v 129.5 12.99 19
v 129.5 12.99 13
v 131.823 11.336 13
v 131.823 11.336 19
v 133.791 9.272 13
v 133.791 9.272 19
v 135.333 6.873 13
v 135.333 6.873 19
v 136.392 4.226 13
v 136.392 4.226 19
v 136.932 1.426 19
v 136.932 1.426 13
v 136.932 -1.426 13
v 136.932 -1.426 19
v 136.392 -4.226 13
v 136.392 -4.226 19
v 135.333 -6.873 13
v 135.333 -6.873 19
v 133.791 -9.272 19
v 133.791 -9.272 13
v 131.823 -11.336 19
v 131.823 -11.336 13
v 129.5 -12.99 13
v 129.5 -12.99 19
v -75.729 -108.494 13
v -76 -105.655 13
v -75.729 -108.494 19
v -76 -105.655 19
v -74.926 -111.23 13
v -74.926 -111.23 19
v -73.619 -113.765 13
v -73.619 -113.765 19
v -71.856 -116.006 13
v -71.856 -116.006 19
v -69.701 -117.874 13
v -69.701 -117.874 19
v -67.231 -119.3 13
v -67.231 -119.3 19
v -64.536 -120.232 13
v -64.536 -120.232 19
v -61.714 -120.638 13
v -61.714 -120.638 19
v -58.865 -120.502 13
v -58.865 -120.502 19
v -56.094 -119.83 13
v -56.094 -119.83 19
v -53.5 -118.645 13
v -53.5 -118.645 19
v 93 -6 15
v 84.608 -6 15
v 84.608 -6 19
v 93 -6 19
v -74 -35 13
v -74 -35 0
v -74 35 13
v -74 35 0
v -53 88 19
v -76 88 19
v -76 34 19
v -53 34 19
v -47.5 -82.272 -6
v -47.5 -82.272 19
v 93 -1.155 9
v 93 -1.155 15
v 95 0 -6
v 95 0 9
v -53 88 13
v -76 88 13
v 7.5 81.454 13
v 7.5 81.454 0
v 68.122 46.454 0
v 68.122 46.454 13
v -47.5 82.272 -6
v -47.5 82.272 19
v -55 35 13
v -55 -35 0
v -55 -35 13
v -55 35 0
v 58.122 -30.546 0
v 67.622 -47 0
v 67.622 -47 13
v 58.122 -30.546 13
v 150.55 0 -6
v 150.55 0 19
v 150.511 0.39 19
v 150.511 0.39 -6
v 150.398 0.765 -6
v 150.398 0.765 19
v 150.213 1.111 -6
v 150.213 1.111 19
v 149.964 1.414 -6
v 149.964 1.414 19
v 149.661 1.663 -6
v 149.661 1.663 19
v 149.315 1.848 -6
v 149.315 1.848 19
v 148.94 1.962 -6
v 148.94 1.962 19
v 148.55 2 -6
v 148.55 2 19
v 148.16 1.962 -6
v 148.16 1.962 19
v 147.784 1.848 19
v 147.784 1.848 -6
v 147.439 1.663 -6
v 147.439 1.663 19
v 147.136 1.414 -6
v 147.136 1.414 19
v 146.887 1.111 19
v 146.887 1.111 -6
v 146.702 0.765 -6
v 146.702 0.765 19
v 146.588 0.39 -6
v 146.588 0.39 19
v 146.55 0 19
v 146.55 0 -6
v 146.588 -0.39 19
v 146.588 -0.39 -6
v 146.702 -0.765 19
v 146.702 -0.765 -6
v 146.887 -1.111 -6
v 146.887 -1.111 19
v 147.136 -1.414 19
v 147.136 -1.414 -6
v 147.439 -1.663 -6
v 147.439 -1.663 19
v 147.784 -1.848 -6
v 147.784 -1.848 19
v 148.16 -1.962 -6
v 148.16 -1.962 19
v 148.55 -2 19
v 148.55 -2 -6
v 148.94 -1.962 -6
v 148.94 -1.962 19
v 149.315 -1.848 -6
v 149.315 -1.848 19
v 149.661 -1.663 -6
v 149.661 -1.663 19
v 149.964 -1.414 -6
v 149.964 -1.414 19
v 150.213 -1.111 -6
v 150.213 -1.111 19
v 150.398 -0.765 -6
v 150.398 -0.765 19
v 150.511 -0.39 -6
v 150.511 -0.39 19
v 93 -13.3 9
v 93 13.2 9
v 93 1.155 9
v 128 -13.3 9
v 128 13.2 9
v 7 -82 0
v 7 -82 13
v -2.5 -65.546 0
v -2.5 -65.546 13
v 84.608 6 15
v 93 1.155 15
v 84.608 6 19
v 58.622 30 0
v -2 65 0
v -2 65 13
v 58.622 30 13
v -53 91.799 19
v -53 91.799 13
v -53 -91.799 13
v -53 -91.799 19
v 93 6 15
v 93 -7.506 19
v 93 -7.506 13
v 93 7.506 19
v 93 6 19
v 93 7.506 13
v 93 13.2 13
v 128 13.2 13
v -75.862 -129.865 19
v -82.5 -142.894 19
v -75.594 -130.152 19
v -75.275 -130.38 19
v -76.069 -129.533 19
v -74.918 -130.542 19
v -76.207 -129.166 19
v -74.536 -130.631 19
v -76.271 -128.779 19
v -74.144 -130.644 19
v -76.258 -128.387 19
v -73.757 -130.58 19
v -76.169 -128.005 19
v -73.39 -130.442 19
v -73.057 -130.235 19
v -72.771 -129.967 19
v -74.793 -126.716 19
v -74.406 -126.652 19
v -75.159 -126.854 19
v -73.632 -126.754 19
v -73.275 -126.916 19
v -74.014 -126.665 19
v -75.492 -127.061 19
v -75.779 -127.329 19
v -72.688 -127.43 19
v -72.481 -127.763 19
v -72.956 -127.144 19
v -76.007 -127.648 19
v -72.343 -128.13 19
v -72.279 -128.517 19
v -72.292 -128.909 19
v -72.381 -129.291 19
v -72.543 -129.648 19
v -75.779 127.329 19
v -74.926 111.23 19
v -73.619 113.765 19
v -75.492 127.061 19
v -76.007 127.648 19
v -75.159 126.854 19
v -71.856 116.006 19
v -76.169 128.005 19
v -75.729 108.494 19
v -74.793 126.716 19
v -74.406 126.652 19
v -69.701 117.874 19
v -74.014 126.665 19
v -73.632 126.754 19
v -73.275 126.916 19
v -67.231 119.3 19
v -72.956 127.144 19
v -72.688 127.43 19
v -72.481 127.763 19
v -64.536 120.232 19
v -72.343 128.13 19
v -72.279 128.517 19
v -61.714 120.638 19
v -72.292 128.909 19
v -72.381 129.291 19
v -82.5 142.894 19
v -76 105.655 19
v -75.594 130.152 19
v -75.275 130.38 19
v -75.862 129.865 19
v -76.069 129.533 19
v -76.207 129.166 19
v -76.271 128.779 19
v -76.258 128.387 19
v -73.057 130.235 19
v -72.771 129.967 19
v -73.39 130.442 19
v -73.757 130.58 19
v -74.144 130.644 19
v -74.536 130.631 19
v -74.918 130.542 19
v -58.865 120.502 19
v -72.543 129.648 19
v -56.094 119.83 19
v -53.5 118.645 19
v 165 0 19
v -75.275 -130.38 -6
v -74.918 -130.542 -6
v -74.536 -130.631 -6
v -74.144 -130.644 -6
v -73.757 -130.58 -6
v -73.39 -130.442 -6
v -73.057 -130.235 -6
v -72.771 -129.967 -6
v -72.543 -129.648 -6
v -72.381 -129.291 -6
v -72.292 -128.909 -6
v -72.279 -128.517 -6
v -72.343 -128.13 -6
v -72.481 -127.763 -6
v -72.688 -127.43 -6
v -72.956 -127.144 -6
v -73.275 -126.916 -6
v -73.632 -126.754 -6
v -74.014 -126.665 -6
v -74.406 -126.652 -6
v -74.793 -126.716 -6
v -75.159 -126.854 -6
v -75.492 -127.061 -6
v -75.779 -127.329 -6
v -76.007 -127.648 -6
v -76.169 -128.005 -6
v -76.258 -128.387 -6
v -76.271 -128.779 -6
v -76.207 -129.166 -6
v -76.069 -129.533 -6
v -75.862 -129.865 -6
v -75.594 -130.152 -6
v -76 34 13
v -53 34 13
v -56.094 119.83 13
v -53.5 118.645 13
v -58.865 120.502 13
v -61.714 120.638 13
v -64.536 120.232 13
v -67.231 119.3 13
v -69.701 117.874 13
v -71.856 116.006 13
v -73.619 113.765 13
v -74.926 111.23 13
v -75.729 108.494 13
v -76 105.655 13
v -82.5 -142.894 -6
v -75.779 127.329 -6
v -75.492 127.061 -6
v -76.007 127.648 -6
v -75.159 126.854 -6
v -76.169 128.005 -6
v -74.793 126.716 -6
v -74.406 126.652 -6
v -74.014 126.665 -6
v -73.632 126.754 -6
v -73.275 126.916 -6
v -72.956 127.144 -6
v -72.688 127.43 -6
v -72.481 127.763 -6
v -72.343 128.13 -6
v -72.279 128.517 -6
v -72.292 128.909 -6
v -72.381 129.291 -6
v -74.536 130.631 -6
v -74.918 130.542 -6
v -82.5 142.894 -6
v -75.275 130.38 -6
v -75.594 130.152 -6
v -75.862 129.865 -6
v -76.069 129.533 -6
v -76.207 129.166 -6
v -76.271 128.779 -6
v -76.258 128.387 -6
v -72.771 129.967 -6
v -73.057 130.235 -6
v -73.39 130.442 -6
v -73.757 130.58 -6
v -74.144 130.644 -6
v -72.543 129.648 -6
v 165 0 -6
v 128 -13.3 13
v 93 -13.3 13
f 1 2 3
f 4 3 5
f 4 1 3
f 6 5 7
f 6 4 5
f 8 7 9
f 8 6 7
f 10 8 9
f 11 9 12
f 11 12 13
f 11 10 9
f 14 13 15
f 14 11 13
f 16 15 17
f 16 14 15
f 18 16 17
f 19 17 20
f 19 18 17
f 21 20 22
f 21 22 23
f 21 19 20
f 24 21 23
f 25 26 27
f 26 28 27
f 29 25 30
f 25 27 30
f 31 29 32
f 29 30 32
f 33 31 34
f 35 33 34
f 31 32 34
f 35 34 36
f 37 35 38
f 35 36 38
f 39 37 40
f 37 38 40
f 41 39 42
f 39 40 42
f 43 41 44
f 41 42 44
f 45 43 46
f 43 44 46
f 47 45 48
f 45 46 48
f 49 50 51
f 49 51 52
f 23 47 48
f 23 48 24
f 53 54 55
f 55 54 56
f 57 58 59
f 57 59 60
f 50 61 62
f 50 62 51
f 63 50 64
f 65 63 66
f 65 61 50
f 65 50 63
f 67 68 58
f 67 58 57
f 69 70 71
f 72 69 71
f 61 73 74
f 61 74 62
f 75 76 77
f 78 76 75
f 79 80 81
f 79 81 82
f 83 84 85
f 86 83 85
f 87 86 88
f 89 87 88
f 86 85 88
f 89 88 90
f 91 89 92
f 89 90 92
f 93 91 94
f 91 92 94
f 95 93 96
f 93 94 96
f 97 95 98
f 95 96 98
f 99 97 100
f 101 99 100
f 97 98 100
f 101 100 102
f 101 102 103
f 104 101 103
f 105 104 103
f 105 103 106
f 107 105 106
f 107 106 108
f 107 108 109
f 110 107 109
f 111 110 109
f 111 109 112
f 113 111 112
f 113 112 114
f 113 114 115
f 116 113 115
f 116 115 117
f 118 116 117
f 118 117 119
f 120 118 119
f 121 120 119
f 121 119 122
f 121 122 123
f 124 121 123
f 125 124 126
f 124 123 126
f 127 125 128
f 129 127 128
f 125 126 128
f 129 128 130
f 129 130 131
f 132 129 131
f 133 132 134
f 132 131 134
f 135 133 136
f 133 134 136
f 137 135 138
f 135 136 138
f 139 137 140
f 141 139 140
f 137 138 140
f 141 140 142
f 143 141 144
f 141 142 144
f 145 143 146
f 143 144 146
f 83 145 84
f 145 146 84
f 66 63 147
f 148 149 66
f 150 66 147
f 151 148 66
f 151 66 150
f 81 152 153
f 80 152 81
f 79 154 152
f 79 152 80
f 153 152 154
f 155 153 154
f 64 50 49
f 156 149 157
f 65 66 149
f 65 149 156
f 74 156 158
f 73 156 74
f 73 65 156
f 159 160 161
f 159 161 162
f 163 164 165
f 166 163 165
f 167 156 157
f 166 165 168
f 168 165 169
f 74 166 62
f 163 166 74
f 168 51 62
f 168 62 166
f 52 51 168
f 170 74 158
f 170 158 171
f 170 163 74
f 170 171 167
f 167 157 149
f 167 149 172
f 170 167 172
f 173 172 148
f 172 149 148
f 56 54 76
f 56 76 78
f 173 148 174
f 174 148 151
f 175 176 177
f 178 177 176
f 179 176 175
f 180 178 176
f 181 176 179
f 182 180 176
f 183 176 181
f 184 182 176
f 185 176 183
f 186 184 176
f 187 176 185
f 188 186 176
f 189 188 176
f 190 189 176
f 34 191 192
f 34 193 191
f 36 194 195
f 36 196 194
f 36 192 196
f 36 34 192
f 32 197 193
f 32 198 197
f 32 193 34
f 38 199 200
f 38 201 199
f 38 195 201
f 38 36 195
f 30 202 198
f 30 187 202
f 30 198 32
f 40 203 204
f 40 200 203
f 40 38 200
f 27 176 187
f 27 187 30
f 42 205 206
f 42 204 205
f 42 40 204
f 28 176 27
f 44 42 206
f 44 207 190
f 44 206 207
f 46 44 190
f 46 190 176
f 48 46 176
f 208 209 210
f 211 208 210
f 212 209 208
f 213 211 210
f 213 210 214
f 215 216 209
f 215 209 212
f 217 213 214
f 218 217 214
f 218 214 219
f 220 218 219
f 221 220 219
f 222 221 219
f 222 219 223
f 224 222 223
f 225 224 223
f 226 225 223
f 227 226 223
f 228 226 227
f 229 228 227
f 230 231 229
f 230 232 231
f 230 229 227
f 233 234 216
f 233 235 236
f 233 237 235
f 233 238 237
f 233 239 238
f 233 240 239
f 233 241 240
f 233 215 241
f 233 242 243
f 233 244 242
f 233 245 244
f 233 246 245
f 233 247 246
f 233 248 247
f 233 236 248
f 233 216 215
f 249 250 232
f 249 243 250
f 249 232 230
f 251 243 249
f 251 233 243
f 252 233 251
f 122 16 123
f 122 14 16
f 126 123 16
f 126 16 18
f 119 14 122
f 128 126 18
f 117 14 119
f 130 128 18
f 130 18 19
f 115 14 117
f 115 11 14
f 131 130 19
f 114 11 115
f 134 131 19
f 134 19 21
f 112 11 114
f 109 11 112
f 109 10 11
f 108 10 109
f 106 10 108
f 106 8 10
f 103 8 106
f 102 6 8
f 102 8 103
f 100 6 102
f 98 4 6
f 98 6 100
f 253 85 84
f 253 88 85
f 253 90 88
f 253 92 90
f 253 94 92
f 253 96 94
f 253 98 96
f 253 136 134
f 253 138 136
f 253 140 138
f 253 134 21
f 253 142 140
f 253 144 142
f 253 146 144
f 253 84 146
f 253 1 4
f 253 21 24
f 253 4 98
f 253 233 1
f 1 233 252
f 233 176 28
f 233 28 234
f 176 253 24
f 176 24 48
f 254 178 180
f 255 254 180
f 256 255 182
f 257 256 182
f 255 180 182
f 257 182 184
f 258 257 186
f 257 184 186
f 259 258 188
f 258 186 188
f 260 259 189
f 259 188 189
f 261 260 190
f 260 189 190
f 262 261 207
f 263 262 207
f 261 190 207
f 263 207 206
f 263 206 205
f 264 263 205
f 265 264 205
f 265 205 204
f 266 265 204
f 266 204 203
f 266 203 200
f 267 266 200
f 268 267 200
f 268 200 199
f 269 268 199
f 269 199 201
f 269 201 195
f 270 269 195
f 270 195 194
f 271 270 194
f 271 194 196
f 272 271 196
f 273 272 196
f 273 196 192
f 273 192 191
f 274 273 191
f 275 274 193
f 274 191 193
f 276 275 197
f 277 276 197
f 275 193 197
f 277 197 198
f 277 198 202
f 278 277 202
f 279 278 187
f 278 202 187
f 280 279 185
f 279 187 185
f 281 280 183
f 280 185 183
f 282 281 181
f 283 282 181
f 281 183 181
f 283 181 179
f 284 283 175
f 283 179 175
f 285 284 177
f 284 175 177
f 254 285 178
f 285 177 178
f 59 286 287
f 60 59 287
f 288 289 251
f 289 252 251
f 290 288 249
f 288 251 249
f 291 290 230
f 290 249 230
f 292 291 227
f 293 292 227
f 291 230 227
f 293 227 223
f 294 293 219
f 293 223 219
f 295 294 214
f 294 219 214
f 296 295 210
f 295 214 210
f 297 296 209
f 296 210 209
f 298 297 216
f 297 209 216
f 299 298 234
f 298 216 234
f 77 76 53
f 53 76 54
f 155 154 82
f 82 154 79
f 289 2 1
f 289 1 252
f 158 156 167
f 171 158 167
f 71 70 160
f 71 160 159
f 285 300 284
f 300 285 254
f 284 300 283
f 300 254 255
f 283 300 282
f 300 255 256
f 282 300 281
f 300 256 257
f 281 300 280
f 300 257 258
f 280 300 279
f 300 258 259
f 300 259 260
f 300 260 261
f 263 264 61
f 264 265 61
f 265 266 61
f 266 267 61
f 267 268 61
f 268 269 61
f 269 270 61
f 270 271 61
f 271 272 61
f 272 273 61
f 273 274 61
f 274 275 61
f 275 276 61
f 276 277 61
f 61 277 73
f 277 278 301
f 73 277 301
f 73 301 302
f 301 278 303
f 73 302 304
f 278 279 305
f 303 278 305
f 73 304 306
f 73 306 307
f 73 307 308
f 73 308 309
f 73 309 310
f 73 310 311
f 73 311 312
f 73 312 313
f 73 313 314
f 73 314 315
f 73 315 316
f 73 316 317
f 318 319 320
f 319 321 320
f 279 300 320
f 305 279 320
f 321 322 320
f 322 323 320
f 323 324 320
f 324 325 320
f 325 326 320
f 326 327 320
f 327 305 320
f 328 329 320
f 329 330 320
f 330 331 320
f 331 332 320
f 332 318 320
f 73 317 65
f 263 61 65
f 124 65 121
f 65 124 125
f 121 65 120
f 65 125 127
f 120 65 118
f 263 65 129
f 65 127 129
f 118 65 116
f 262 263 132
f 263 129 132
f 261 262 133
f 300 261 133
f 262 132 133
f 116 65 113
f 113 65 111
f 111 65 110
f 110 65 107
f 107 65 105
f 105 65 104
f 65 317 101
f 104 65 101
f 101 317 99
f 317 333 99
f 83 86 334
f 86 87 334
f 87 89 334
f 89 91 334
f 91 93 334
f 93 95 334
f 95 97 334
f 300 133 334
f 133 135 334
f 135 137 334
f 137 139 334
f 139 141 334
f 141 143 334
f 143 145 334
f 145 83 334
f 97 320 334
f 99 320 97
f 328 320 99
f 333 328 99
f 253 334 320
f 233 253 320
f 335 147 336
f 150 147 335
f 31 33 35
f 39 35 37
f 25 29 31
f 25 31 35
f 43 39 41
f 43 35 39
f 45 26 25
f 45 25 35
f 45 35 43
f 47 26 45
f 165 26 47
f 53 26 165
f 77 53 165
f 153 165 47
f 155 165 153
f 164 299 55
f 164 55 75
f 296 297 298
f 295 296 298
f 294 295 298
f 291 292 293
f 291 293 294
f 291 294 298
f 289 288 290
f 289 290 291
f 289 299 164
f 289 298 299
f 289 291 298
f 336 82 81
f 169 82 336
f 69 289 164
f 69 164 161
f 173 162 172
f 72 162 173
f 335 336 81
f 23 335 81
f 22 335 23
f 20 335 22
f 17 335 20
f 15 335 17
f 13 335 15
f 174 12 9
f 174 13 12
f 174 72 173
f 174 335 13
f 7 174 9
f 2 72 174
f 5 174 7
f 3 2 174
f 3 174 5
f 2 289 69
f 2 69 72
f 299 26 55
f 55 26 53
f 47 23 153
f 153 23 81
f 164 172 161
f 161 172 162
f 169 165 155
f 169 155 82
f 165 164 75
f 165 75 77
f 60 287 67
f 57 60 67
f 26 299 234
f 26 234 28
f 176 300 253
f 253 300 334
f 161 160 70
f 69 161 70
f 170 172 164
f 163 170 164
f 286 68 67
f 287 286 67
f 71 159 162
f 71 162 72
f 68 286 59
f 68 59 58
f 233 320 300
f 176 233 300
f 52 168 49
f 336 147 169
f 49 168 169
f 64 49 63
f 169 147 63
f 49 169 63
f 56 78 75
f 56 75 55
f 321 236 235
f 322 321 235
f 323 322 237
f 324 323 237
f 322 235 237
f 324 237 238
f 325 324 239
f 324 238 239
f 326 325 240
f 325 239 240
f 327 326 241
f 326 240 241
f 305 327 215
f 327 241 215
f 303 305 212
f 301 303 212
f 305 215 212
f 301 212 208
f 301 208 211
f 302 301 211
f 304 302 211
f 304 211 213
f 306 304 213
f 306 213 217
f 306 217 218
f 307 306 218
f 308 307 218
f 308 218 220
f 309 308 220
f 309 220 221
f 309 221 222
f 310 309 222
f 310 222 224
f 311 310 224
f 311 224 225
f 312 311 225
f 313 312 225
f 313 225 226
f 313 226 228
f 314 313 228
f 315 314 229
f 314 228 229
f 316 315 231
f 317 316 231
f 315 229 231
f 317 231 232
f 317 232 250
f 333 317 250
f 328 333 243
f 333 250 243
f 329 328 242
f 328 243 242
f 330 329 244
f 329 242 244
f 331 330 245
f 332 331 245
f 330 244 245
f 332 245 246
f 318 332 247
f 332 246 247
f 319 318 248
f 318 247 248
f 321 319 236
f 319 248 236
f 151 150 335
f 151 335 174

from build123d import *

# Parameters (mm, degrees)
BOX005_W               = 23
BOX005_H               = 54
BOX005_DEPTH           = 6
PRISM003_DEPTH         = 6
PRISM002_DEPTH         = 6
BOX004_W               = 10
BOX004_H               = 12
BOX004_DEPTH           = 4
BOX003_W               = 35
BOX003_H               = 26.5
BOX003_DEPTH           = 10
BOX002_W               = 70
BOX002_H               = 19
BOX002_DEPTH           = 19
BOX002_PLACEMENT_ANGLE = 30
BOX001_W               = 70
BOX001_H               = 19
BOX001_DEPTH           = 19
BOX001_PLACEMENT_ANGLE = 90
BOX_W                  = 70
BOX_H                  = 19
BOX_DEPTH              = 19
BOX_PLACEMENT_ANGLE    = 30
PRISM001_DEPTH         = 25
PRISM_DEPTH            = 25
FILLET_R               = 15
SKETCH001_R            = 2
POCKET_DEPTH           = 782.777352
POLARPATTERN_COUNT     = 3


with BuildPart() as box005:
    # Box005 → Box005 (new body)
    with BuildSketch(Plane(origin=(-76, 34, 13), x_dir=(1, 0, 0), z_dir=(0, 0, 1))):
        with Locations((11.5, 27)):
            Rectangle(BOX005_W, BOX005_H)
    extrude(amount=BOX005_DEPTH)


with BuildPart() as prism003:
    # Prism003 → Prism003 (new body)
    with BuildSketch(Plane.XY.offset(13)):
        Polygon((106, 0), (-53, 91.798693), (-53, -91.798693), align=None)
    extrude(amount=PRISM003_DEPTH)


with BuildPart() as cut006:
    # Prism002 → Prism002 (new body)
    with BuildSketch(Plane.XY.offset(13)):
        Polygon((152, 0), (-76, 131.635861), (-76, -131.635861), align=None)
    extrude(amount=PRISM002_DEPTH)

    # Cut006: cut Prism003
    add(prism003.part, mode=Mode.SUBTRACT)


with BuildPart() as box004:
    # Box004 → Box004 (new body)
    with BuildSketch(Plane(origin=(84, -6, 15), x_dir=(1, 0, 0), z_dir=(0, 0, 1))):
        with Locations((5, 6)):
            Rectangle(BOX004_W, BOX004_H)
    extrude(amount=BOX004_DEPTH)


with BuildPart() as box003:
    # Box003 → Box003 (new body)
    with BuildSketch(Plane(origin=(93, -13.3, 9), x_dir=(1, 0, 0), z_dir=(0, 0, 1))):
        with Locations((17.5, 13.25)):
            Rectangle(BOX003_W, BOX003_H)
    extrude(amount=BOX003_DEPTH)


with BuildPart() as box002:
    # Box002 → Box002 (new body)
    with BuildSketch(Plane.XY):
        with Locations((35, 9.5)):
            Rectangle(BOX002_W, BOX002_H)
    extrude(amount=BOX002_DEPTH)


with BuildPart() as box002_1:
    # Box002 placement: moved
    add(box002.part.moved(Location((7, -82, 0))).rotate(Axis((7, -82, 0), (0, 0, 1)), BOX002_PLACEMENT_ANGLE))


with BuildPart() as box001:
    # Box001 → Box001 (new body)
    with BuildSketch(Plane.XY):
        with Locations((35, 9.5)):
            Rectangle(BOX001_W, BOX001_H)
    extrude(amount=BOX001_DEPTH)


with BuildPart() as box001_1:
    # Box001 placement: moved
    add(box001.part.moved(Location((-55, -35, 0))).rotate(Axis((-55, -35, 0), (0, 0, 1)), BOX001_PLACEMENT_ANGLE))


with BuildPart() as box:
    # Box → Box (new body)
    with BuildSketch(Plane.XY):
        with Locations((35, 9.5)):
            Rectangle(BOX_W, BOX_H)
    extrude(amount=BOX_DEPTH)


with BuildPart() as box_1:
    # Box placement: moved
    add(box.part.moved(Location((-2, 65, 0))).rotate(Axis((-2, 65, 0), (0, 0, -1)), BOX_PLACEMENT_ANGLE))


with BuildPart() as prism001:
    # Prism001 → Prism001 (new body)
    with BuildSketch(Plane.XY.offset(-6)):
        Polygon((95, 0), (-47.5, 82.272413), (-47.5, -82.272413), align=None)
    extrude(amount=PRISM001_DEPTH)


with BuildPart() as body:
    # Prism → Prism (new body)
    with BuildSketch(Plane.XY.offset(-6)):
        Polygon((165, 0), (-82.5, 142.894192), (-82.5, -142.894192), align=None)
    extrude(amount=PRISM_DEPTH)

    # Cut: cut Prism001
    add(prism001.part, mode=Mode.SUBTRACT)

    # Cut001: cut Box
    add(box_1.part, mode=Mode.SUBTRACT)

    # Cut002: cut Box001
    add(box001_1.part, mode=Mode.SUBTRACT)

    # Cut003: cut Box002
    add(box002_1.part, mode=Mode.SUBTRACT)

    # Cut004: cut Box003
    add(box003.part, mode=Mode.SUBTRACT)

    # Cut005: cut Box004
    add(box004.part, mode=Mode.SUBTRACT)

    # Cut007: cut Cut006
    add(cut006.part, mode=Mode.SUBTRACT)

    # Fillet
    fillet_edges = [body.edges().sort_by_distance(p)[0] for p in [
        (152, 0, 16),
        (-76, 131.635861, 16),
        (-76, -131.635861, 16),
    ]]
    fillet(fillet_edges, radius=FILLET_R)

    # Sketch001 (on Face1 of BaseFeature) → Pocket (cut, through all)
    with BuildSketch(Plane.XY.offset(19)):
        with Locations((148.549835, 0)):
            Circle(SKETCH001_R)
    pocket = extrude(amount=-POCKET_DEPTH, mode=Mode.SUBTRACT)

    # PolarPattern: Pocket ×3 about axis
    polarpattern_axis = Axis((0, 0, 19), (0, 0, 1))
    for i in range(1, POLARPATTERN_COUNT):
        add(pocket.rotate(polarpattern_axis, i * 360 / POLARPATTERN_COUNT), mode=Mode.SUBTRACT)


solid = Compound([box005.part, body.part])
